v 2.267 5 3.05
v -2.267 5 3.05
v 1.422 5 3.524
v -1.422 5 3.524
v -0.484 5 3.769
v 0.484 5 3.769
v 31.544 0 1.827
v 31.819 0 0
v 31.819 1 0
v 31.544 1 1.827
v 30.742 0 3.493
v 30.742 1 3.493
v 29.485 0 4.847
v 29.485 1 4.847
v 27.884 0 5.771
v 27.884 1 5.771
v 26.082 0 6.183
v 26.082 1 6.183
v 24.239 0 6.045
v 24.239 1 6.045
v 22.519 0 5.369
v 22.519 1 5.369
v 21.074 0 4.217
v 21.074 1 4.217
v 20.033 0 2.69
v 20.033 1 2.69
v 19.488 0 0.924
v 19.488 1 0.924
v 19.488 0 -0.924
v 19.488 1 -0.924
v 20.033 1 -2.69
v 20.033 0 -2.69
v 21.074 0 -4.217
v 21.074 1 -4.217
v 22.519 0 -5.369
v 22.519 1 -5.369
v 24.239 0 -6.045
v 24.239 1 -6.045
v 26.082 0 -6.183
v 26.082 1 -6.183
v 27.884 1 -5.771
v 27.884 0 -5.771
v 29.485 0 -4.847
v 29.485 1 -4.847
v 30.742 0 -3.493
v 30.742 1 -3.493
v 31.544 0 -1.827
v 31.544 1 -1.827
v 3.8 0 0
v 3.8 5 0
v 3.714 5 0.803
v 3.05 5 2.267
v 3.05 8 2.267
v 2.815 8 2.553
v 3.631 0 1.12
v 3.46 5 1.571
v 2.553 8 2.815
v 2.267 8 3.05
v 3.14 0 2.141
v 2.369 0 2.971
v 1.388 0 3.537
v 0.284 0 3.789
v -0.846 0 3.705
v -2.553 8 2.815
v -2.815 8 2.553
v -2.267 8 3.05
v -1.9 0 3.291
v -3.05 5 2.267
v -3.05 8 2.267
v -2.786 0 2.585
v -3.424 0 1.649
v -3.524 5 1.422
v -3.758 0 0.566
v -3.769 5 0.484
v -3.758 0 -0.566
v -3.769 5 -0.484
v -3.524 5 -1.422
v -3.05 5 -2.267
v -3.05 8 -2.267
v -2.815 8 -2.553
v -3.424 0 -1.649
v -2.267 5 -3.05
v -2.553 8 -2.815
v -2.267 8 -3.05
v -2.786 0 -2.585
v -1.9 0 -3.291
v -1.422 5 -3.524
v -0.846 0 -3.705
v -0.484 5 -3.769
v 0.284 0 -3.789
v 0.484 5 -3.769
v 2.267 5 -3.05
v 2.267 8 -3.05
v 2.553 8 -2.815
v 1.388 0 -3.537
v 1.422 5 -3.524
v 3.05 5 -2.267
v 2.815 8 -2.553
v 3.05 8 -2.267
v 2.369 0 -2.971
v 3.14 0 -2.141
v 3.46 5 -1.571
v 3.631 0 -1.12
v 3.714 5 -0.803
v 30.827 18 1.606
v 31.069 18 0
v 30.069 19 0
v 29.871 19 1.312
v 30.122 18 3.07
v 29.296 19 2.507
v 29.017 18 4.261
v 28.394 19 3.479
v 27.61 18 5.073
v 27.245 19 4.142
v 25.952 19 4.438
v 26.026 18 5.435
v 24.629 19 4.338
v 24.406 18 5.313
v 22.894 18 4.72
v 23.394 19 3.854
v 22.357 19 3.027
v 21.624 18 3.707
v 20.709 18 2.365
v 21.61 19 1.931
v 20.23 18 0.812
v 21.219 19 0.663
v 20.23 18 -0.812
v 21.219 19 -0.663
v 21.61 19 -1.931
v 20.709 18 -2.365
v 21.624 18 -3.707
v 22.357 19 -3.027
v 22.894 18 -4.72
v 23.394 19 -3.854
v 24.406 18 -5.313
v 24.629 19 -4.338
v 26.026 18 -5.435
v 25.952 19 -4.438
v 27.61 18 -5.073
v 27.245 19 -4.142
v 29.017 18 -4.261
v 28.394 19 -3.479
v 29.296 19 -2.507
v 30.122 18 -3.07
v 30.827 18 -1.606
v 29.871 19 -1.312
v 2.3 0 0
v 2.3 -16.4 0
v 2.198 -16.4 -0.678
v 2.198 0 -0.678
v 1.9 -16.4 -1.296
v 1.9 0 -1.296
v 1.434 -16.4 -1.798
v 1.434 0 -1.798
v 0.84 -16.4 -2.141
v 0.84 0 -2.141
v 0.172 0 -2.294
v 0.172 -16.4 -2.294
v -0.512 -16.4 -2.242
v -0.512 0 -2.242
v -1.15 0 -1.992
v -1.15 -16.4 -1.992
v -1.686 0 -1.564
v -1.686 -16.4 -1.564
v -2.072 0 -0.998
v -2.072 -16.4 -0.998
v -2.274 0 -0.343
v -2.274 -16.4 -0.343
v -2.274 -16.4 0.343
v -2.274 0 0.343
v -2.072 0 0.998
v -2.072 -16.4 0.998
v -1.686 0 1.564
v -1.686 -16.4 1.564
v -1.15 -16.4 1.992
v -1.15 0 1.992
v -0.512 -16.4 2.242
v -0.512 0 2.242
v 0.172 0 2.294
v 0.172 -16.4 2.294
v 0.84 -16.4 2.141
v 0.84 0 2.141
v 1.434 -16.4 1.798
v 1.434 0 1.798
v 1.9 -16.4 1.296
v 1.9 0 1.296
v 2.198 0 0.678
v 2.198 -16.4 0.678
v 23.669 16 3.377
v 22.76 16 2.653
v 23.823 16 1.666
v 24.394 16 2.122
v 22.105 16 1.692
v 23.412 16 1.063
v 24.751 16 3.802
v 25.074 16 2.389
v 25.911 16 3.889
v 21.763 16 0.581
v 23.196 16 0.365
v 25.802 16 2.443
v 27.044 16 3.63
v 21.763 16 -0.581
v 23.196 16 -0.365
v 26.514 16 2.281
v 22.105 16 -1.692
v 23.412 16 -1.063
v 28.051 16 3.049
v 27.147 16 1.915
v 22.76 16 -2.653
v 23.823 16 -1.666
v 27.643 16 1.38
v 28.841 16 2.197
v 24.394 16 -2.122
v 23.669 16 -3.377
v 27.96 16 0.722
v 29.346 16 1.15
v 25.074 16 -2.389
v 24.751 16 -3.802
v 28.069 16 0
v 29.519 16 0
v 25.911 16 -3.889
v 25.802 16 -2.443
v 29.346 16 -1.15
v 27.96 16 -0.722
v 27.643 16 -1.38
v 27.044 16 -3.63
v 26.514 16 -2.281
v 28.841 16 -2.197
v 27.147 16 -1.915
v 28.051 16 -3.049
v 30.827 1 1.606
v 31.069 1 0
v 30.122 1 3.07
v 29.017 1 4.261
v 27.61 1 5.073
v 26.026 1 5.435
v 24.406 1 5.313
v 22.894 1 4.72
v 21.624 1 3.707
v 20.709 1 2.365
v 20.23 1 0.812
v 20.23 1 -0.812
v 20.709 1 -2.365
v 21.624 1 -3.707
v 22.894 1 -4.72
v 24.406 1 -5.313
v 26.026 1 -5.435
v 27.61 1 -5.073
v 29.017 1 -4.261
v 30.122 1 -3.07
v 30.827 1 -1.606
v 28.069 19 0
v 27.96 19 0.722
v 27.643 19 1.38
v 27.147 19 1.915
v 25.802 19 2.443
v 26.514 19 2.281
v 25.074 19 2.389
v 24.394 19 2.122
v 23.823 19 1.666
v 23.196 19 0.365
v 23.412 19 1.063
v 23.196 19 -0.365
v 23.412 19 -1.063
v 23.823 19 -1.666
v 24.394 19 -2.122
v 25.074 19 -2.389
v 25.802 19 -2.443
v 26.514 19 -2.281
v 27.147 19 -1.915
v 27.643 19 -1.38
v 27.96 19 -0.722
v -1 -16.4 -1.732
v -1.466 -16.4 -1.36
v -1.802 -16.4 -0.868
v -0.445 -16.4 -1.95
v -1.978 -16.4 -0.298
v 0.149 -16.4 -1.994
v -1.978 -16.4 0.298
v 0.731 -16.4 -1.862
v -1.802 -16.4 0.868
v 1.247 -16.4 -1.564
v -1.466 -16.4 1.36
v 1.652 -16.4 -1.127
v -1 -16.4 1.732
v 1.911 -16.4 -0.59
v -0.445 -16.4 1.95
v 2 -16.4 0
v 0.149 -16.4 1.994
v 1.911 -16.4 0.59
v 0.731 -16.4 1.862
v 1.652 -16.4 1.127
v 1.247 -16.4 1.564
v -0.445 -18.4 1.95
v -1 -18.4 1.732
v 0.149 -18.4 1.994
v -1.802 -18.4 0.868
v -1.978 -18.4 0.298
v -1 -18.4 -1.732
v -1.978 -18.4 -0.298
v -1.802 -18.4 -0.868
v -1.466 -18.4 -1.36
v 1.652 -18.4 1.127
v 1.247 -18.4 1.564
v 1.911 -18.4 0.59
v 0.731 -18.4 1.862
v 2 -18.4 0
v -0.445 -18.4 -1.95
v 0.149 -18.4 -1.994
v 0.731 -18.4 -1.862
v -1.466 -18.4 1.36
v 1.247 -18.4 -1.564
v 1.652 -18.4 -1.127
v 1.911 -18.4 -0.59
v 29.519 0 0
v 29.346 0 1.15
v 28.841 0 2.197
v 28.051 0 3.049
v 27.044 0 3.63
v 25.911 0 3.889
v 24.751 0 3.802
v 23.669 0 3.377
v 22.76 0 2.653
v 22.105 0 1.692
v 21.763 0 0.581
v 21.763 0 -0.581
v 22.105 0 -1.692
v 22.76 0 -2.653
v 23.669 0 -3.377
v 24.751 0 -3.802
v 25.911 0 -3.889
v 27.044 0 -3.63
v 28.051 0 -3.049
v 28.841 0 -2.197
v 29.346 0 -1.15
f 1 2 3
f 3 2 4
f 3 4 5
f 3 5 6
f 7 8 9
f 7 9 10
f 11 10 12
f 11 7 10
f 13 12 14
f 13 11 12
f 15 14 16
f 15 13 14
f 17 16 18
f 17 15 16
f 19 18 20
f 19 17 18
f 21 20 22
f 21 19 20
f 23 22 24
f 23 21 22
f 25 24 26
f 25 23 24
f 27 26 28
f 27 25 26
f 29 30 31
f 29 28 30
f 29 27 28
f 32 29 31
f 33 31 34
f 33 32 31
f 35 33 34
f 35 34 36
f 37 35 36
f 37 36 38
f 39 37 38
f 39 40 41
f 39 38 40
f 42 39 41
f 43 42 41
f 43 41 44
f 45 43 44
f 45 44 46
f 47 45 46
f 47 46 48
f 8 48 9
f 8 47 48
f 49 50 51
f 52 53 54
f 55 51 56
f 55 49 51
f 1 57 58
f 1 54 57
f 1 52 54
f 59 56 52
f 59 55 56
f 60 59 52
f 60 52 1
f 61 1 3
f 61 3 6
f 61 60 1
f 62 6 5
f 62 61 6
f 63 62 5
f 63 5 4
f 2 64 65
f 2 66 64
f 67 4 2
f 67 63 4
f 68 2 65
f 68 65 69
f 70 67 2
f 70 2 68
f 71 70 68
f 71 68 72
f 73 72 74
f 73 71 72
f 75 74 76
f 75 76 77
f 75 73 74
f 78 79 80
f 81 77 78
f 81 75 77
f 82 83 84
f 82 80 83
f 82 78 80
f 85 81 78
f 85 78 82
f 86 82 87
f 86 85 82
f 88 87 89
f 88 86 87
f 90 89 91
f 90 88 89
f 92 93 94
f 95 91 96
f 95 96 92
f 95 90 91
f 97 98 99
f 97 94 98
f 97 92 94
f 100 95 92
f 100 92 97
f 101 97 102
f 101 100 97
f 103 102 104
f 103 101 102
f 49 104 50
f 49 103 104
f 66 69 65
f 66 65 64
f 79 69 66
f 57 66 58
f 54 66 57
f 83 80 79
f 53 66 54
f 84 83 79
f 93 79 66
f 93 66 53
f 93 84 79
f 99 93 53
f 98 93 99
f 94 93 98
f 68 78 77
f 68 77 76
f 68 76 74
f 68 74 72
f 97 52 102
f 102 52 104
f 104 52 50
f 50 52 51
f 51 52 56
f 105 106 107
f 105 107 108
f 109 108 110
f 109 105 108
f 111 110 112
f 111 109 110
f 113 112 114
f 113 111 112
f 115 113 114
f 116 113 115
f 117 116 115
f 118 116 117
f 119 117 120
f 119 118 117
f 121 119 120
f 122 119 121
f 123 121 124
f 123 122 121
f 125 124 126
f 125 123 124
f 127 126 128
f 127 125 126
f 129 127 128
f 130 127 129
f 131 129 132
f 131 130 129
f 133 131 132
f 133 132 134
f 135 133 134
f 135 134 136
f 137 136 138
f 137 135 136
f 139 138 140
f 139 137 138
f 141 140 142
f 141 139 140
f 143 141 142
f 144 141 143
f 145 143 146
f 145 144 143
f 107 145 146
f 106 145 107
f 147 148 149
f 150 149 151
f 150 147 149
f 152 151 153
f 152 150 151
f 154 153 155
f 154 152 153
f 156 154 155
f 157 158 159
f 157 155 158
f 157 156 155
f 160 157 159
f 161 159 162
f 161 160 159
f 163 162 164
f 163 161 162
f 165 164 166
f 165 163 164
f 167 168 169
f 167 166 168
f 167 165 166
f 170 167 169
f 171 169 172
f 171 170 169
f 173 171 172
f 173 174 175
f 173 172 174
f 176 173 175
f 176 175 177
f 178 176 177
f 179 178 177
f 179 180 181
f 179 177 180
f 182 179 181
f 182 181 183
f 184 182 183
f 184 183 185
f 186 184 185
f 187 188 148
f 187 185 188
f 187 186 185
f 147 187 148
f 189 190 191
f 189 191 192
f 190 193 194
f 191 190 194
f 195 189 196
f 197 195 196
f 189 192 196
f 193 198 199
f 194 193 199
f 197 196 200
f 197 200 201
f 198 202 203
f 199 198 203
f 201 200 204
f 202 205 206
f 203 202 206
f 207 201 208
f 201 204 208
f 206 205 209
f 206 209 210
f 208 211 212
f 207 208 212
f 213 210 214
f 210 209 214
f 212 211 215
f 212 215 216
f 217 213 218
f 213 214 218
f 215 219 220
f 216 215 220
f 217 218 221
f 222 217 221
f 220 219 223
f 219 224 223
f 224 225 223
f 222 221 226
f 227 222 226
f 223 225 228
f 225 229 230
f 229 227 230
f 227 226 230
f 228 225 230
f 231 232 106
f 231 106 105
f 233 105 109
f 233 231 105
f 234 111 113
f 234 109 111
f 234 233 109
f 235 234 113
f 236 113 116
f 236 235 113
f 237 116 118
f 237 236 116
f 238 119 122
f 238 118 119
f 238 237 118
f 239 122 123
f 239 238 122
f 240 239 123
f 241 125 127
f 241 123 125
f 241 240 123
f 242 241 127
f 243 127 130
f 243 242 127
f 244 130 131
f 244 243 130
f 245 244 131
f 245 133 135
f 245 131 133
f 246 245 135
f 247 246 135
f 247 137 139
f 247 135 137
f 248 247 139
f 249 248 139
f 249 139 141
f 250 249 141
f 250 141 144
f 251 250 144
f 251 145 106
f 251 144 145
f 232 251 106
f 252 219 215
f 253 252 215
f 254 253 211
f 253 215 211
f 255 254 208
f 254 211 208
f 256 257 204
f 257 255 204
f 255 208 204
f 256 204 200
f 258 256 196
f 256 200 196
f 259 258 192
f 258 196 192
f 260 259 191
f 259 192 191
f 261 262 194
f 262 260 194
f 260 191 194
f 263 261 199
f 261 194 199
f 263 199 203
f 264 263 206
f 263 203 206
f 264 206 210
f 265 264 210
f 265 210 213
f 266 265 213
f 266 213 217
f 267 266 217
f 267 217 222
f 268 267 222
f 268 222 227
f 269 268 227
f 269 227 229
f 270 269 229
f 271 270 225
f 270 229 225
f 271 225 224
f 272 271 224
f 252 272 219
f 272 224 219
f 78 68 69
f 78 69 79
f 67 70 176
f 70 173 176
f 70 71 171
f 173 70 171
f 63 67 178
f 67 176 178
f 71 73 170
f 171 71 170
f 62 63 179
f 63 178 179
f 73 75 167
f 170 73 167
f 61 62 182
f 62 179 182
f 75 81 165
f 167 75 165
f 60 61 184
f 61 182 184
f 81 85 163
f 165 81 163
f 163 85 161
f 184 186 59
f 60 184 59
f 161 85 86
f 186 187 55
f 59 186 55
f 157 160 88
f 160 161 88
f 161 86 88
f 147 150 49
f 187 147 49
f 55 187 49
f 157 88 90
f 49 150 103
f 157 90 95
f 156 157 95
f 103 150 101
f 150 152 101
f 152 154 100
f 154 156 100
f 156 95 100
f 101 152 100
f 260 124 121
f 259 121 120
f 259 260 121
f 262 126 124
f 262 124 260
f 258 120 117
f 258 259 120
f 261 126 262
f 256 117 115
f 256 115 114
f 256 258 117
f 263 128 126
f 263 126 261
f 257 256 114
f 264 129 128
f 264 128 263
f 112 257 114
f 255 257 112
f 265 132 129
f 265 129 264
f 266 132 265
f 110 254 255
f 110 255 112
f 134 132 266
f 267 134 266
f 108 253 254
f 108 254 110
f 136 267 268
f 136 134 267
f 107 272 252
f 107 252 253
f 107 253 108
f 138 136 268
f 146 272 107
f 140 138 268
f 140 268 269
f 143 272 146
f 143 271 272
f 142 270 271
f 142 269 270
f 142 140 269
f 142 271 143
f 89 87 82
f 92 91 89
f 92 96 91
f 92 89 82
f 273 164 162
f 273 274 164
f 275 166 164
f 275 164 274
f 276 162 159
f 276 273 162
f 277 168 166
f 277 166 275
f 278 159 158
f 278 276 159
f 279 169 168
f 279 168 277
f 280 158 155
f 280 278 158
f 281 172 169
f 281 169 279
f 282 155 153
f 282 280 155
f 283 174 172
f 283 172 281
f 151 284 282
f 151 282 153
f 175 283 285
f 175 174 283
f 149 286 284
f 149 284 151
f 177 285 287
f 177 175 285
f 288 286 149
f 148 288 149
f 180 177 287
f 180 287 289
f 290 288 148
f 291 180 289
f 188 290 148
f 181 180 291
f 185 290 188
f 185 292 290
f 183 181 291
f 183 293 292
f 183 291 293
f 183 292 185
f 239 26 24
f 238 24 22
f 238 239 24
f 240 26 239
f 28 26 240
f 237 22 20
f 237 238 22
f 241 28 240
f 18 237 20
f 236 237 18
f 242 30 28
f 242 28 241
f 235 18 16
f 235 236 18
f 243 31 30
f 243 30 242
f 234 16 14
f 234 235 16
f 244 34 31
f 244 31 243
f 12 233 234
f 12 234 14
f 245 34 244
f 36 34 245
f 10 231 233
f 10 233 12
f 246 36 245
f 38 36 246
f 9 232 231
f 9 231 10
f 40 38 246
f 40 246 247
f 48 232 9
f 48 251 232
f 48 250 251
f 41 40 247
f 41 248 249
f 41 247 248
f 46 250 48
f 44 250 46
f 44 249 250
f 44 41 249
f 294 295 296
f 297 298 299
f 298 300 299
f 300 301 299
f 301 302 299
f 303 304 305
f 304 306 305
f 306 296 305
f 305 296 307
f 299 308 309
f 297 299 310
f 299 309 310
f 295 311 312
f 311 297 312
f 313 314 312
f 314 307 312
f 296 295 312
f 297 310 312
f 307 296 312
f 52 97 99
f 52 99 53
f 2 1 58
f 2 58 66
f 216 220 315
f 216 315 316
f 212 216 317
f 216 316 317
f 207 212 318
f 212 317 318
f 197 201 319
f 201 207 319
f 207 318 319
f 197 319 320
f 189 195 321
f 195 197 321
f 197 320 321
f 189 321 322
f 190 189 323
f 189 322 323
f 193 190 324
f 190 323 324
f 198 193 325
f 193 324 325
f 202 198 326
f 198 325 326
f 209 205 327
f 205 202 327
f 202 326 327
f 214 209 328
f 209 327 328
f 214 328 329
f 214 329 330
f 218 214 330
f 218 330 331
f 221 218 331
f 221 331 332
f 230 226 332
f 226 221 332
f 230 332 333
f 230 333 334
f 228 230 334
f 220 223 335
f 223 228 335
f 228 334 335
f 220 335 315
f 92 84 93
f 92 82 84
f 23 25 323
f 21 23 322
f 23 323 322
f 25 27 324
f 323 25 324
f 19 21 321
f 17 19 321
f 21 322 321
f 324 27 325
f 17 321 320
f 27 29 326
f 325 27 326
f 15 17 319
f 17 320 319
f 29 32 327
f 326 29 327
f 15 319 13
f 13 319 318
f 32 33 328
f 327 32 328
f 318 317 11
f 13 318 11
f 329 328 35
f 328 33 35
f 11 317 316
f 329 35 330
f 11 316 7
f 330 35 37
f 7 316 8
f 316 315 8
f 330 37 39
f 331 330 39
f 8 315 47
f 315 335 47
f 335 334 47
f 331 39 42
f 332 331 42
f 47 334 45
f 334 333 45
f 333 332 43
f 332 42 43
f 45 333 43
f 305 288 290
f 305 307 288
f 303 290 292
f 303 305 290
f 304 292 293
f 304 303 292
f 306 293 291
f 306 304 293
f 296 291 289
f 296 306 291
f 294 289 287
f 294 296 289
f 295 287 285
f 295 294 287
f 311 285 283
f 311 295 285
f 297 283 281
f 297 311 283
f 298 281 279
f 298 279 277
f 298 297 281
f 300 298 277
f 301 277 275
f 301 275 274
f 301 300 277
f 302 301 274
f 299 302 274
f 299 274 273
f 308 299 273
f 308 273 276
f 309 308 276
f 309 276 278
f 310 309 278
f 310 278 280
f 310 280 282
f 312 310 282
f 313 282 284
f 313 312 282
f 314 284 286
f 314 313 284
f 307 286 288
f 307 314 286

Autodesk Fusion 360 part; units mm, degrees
sketch "Sketch1" plane through (0, 0, 0) normal (0, 1, 0) x (1, 0, 0) in component "SPINDLE"
  circle A0 centre (0, 0) radius 3.8
  line L0 (-3.05, 3.05) -> (3.05, 3.05)
  line L1 (3.05, 3.05) -> (3.05, -3.05)
  line L2 (3.05, -3.05) -> (-3.05, -3.05)
  line L3 (-3.05, -3.05) -> (-3.05, 3.05)
  line L4 (-3.05, 3.05) -> (3.05, -3.05) construction
  line L5 (3.05, 3.05) -> (-3.05, -3.05) construction
  circle A1 centre (0, 0) radius 2.3
  dimension "d3" = 7.6
  dimension "d4" = 6.1
  dimension "d5" = 6.1
  dimension "d6" = 4.6
sketch "Sketch2" plane through (0, 0, 0) normal (0, 1, 0) x (1, 0, 0) in component "DRUM"
  line L0 (25.6191, 10.852) -> (25.6191, -10.852) construction
  line L1 (12.1191, 0) -> (39.1191, 0) construction
  circle A0 centre (25.6191, 0) radius 6.2
  circle A1 centre (25.6191, 0) radius 5.45
  circle A2 centre (25.6191, 0) radius 2.45
  circle A3 centre (25.6191, 0) radius 3.9
  dimension "d7" = 12.4
  dimension "d8" = 10.9
  dimension "d9" = 4.9
  dimension "d10" = 7.8
extrude "Extrude1" add sketch "Sketch1" against normal blind 18.4 contours A1 makes body 1 in component "SPINDLE"
extrude "Extrude2" add sketch "Sketch1" along normal blind 5 contours A0 L1 | A0 L0 L1 L2 L3 | A0 L0 | A0 L2 | A0 L3 | A1 bodies 1 in component "SPINDLE"
extrude "Extrude3" add sketch "Sketch1" along normal blind 8 contours A0 L0 L1 L2 L3 | A1 bodies 1 in component "SPINDLE"
extrude "Extrude1'" add sketch "Sketch2" along normal blind 19 separate body contours A1 | A3 makes body 2 in component "DRUM"
extrude "Extrude2'" add sketch "Sketch2" along normal blind 1 contours A0 bodies 2 in component "DRUM"
extrude "Extrude3'" cut sketch "Sketch2" along normal blind 16 contours A3 bodies 2 in component "DRUM"
chamfer "Chamfer1" distance 1 angle 45 1 edges at (20.538, 19, 1.9708) on bodies 2 in component "DRUM"
sketch "Sketch3" plane through (0, -18.4, 0) normal (0, -1, 0) x (1, 0, 0)
  circle A0 centre (0, 0) radius 2.3
  circle A1 centre (0, 0) radius 2
  dimension "d24" = 4
extrude "Extrude4" cut sketch "Sketch3" against normal blind 2 bodies 1 in component "SPINDLE"
component "SPINDLE" placed x (1, 0, 0) y (0, 1, 0) z (0, 0, 1) at (0, 0, 0)
component "DRUM" placed x (1, 0, 0) y (0, 1, 0) z (0, 0, 1) at (0, 0, 0)
equation "d5 = d4"
